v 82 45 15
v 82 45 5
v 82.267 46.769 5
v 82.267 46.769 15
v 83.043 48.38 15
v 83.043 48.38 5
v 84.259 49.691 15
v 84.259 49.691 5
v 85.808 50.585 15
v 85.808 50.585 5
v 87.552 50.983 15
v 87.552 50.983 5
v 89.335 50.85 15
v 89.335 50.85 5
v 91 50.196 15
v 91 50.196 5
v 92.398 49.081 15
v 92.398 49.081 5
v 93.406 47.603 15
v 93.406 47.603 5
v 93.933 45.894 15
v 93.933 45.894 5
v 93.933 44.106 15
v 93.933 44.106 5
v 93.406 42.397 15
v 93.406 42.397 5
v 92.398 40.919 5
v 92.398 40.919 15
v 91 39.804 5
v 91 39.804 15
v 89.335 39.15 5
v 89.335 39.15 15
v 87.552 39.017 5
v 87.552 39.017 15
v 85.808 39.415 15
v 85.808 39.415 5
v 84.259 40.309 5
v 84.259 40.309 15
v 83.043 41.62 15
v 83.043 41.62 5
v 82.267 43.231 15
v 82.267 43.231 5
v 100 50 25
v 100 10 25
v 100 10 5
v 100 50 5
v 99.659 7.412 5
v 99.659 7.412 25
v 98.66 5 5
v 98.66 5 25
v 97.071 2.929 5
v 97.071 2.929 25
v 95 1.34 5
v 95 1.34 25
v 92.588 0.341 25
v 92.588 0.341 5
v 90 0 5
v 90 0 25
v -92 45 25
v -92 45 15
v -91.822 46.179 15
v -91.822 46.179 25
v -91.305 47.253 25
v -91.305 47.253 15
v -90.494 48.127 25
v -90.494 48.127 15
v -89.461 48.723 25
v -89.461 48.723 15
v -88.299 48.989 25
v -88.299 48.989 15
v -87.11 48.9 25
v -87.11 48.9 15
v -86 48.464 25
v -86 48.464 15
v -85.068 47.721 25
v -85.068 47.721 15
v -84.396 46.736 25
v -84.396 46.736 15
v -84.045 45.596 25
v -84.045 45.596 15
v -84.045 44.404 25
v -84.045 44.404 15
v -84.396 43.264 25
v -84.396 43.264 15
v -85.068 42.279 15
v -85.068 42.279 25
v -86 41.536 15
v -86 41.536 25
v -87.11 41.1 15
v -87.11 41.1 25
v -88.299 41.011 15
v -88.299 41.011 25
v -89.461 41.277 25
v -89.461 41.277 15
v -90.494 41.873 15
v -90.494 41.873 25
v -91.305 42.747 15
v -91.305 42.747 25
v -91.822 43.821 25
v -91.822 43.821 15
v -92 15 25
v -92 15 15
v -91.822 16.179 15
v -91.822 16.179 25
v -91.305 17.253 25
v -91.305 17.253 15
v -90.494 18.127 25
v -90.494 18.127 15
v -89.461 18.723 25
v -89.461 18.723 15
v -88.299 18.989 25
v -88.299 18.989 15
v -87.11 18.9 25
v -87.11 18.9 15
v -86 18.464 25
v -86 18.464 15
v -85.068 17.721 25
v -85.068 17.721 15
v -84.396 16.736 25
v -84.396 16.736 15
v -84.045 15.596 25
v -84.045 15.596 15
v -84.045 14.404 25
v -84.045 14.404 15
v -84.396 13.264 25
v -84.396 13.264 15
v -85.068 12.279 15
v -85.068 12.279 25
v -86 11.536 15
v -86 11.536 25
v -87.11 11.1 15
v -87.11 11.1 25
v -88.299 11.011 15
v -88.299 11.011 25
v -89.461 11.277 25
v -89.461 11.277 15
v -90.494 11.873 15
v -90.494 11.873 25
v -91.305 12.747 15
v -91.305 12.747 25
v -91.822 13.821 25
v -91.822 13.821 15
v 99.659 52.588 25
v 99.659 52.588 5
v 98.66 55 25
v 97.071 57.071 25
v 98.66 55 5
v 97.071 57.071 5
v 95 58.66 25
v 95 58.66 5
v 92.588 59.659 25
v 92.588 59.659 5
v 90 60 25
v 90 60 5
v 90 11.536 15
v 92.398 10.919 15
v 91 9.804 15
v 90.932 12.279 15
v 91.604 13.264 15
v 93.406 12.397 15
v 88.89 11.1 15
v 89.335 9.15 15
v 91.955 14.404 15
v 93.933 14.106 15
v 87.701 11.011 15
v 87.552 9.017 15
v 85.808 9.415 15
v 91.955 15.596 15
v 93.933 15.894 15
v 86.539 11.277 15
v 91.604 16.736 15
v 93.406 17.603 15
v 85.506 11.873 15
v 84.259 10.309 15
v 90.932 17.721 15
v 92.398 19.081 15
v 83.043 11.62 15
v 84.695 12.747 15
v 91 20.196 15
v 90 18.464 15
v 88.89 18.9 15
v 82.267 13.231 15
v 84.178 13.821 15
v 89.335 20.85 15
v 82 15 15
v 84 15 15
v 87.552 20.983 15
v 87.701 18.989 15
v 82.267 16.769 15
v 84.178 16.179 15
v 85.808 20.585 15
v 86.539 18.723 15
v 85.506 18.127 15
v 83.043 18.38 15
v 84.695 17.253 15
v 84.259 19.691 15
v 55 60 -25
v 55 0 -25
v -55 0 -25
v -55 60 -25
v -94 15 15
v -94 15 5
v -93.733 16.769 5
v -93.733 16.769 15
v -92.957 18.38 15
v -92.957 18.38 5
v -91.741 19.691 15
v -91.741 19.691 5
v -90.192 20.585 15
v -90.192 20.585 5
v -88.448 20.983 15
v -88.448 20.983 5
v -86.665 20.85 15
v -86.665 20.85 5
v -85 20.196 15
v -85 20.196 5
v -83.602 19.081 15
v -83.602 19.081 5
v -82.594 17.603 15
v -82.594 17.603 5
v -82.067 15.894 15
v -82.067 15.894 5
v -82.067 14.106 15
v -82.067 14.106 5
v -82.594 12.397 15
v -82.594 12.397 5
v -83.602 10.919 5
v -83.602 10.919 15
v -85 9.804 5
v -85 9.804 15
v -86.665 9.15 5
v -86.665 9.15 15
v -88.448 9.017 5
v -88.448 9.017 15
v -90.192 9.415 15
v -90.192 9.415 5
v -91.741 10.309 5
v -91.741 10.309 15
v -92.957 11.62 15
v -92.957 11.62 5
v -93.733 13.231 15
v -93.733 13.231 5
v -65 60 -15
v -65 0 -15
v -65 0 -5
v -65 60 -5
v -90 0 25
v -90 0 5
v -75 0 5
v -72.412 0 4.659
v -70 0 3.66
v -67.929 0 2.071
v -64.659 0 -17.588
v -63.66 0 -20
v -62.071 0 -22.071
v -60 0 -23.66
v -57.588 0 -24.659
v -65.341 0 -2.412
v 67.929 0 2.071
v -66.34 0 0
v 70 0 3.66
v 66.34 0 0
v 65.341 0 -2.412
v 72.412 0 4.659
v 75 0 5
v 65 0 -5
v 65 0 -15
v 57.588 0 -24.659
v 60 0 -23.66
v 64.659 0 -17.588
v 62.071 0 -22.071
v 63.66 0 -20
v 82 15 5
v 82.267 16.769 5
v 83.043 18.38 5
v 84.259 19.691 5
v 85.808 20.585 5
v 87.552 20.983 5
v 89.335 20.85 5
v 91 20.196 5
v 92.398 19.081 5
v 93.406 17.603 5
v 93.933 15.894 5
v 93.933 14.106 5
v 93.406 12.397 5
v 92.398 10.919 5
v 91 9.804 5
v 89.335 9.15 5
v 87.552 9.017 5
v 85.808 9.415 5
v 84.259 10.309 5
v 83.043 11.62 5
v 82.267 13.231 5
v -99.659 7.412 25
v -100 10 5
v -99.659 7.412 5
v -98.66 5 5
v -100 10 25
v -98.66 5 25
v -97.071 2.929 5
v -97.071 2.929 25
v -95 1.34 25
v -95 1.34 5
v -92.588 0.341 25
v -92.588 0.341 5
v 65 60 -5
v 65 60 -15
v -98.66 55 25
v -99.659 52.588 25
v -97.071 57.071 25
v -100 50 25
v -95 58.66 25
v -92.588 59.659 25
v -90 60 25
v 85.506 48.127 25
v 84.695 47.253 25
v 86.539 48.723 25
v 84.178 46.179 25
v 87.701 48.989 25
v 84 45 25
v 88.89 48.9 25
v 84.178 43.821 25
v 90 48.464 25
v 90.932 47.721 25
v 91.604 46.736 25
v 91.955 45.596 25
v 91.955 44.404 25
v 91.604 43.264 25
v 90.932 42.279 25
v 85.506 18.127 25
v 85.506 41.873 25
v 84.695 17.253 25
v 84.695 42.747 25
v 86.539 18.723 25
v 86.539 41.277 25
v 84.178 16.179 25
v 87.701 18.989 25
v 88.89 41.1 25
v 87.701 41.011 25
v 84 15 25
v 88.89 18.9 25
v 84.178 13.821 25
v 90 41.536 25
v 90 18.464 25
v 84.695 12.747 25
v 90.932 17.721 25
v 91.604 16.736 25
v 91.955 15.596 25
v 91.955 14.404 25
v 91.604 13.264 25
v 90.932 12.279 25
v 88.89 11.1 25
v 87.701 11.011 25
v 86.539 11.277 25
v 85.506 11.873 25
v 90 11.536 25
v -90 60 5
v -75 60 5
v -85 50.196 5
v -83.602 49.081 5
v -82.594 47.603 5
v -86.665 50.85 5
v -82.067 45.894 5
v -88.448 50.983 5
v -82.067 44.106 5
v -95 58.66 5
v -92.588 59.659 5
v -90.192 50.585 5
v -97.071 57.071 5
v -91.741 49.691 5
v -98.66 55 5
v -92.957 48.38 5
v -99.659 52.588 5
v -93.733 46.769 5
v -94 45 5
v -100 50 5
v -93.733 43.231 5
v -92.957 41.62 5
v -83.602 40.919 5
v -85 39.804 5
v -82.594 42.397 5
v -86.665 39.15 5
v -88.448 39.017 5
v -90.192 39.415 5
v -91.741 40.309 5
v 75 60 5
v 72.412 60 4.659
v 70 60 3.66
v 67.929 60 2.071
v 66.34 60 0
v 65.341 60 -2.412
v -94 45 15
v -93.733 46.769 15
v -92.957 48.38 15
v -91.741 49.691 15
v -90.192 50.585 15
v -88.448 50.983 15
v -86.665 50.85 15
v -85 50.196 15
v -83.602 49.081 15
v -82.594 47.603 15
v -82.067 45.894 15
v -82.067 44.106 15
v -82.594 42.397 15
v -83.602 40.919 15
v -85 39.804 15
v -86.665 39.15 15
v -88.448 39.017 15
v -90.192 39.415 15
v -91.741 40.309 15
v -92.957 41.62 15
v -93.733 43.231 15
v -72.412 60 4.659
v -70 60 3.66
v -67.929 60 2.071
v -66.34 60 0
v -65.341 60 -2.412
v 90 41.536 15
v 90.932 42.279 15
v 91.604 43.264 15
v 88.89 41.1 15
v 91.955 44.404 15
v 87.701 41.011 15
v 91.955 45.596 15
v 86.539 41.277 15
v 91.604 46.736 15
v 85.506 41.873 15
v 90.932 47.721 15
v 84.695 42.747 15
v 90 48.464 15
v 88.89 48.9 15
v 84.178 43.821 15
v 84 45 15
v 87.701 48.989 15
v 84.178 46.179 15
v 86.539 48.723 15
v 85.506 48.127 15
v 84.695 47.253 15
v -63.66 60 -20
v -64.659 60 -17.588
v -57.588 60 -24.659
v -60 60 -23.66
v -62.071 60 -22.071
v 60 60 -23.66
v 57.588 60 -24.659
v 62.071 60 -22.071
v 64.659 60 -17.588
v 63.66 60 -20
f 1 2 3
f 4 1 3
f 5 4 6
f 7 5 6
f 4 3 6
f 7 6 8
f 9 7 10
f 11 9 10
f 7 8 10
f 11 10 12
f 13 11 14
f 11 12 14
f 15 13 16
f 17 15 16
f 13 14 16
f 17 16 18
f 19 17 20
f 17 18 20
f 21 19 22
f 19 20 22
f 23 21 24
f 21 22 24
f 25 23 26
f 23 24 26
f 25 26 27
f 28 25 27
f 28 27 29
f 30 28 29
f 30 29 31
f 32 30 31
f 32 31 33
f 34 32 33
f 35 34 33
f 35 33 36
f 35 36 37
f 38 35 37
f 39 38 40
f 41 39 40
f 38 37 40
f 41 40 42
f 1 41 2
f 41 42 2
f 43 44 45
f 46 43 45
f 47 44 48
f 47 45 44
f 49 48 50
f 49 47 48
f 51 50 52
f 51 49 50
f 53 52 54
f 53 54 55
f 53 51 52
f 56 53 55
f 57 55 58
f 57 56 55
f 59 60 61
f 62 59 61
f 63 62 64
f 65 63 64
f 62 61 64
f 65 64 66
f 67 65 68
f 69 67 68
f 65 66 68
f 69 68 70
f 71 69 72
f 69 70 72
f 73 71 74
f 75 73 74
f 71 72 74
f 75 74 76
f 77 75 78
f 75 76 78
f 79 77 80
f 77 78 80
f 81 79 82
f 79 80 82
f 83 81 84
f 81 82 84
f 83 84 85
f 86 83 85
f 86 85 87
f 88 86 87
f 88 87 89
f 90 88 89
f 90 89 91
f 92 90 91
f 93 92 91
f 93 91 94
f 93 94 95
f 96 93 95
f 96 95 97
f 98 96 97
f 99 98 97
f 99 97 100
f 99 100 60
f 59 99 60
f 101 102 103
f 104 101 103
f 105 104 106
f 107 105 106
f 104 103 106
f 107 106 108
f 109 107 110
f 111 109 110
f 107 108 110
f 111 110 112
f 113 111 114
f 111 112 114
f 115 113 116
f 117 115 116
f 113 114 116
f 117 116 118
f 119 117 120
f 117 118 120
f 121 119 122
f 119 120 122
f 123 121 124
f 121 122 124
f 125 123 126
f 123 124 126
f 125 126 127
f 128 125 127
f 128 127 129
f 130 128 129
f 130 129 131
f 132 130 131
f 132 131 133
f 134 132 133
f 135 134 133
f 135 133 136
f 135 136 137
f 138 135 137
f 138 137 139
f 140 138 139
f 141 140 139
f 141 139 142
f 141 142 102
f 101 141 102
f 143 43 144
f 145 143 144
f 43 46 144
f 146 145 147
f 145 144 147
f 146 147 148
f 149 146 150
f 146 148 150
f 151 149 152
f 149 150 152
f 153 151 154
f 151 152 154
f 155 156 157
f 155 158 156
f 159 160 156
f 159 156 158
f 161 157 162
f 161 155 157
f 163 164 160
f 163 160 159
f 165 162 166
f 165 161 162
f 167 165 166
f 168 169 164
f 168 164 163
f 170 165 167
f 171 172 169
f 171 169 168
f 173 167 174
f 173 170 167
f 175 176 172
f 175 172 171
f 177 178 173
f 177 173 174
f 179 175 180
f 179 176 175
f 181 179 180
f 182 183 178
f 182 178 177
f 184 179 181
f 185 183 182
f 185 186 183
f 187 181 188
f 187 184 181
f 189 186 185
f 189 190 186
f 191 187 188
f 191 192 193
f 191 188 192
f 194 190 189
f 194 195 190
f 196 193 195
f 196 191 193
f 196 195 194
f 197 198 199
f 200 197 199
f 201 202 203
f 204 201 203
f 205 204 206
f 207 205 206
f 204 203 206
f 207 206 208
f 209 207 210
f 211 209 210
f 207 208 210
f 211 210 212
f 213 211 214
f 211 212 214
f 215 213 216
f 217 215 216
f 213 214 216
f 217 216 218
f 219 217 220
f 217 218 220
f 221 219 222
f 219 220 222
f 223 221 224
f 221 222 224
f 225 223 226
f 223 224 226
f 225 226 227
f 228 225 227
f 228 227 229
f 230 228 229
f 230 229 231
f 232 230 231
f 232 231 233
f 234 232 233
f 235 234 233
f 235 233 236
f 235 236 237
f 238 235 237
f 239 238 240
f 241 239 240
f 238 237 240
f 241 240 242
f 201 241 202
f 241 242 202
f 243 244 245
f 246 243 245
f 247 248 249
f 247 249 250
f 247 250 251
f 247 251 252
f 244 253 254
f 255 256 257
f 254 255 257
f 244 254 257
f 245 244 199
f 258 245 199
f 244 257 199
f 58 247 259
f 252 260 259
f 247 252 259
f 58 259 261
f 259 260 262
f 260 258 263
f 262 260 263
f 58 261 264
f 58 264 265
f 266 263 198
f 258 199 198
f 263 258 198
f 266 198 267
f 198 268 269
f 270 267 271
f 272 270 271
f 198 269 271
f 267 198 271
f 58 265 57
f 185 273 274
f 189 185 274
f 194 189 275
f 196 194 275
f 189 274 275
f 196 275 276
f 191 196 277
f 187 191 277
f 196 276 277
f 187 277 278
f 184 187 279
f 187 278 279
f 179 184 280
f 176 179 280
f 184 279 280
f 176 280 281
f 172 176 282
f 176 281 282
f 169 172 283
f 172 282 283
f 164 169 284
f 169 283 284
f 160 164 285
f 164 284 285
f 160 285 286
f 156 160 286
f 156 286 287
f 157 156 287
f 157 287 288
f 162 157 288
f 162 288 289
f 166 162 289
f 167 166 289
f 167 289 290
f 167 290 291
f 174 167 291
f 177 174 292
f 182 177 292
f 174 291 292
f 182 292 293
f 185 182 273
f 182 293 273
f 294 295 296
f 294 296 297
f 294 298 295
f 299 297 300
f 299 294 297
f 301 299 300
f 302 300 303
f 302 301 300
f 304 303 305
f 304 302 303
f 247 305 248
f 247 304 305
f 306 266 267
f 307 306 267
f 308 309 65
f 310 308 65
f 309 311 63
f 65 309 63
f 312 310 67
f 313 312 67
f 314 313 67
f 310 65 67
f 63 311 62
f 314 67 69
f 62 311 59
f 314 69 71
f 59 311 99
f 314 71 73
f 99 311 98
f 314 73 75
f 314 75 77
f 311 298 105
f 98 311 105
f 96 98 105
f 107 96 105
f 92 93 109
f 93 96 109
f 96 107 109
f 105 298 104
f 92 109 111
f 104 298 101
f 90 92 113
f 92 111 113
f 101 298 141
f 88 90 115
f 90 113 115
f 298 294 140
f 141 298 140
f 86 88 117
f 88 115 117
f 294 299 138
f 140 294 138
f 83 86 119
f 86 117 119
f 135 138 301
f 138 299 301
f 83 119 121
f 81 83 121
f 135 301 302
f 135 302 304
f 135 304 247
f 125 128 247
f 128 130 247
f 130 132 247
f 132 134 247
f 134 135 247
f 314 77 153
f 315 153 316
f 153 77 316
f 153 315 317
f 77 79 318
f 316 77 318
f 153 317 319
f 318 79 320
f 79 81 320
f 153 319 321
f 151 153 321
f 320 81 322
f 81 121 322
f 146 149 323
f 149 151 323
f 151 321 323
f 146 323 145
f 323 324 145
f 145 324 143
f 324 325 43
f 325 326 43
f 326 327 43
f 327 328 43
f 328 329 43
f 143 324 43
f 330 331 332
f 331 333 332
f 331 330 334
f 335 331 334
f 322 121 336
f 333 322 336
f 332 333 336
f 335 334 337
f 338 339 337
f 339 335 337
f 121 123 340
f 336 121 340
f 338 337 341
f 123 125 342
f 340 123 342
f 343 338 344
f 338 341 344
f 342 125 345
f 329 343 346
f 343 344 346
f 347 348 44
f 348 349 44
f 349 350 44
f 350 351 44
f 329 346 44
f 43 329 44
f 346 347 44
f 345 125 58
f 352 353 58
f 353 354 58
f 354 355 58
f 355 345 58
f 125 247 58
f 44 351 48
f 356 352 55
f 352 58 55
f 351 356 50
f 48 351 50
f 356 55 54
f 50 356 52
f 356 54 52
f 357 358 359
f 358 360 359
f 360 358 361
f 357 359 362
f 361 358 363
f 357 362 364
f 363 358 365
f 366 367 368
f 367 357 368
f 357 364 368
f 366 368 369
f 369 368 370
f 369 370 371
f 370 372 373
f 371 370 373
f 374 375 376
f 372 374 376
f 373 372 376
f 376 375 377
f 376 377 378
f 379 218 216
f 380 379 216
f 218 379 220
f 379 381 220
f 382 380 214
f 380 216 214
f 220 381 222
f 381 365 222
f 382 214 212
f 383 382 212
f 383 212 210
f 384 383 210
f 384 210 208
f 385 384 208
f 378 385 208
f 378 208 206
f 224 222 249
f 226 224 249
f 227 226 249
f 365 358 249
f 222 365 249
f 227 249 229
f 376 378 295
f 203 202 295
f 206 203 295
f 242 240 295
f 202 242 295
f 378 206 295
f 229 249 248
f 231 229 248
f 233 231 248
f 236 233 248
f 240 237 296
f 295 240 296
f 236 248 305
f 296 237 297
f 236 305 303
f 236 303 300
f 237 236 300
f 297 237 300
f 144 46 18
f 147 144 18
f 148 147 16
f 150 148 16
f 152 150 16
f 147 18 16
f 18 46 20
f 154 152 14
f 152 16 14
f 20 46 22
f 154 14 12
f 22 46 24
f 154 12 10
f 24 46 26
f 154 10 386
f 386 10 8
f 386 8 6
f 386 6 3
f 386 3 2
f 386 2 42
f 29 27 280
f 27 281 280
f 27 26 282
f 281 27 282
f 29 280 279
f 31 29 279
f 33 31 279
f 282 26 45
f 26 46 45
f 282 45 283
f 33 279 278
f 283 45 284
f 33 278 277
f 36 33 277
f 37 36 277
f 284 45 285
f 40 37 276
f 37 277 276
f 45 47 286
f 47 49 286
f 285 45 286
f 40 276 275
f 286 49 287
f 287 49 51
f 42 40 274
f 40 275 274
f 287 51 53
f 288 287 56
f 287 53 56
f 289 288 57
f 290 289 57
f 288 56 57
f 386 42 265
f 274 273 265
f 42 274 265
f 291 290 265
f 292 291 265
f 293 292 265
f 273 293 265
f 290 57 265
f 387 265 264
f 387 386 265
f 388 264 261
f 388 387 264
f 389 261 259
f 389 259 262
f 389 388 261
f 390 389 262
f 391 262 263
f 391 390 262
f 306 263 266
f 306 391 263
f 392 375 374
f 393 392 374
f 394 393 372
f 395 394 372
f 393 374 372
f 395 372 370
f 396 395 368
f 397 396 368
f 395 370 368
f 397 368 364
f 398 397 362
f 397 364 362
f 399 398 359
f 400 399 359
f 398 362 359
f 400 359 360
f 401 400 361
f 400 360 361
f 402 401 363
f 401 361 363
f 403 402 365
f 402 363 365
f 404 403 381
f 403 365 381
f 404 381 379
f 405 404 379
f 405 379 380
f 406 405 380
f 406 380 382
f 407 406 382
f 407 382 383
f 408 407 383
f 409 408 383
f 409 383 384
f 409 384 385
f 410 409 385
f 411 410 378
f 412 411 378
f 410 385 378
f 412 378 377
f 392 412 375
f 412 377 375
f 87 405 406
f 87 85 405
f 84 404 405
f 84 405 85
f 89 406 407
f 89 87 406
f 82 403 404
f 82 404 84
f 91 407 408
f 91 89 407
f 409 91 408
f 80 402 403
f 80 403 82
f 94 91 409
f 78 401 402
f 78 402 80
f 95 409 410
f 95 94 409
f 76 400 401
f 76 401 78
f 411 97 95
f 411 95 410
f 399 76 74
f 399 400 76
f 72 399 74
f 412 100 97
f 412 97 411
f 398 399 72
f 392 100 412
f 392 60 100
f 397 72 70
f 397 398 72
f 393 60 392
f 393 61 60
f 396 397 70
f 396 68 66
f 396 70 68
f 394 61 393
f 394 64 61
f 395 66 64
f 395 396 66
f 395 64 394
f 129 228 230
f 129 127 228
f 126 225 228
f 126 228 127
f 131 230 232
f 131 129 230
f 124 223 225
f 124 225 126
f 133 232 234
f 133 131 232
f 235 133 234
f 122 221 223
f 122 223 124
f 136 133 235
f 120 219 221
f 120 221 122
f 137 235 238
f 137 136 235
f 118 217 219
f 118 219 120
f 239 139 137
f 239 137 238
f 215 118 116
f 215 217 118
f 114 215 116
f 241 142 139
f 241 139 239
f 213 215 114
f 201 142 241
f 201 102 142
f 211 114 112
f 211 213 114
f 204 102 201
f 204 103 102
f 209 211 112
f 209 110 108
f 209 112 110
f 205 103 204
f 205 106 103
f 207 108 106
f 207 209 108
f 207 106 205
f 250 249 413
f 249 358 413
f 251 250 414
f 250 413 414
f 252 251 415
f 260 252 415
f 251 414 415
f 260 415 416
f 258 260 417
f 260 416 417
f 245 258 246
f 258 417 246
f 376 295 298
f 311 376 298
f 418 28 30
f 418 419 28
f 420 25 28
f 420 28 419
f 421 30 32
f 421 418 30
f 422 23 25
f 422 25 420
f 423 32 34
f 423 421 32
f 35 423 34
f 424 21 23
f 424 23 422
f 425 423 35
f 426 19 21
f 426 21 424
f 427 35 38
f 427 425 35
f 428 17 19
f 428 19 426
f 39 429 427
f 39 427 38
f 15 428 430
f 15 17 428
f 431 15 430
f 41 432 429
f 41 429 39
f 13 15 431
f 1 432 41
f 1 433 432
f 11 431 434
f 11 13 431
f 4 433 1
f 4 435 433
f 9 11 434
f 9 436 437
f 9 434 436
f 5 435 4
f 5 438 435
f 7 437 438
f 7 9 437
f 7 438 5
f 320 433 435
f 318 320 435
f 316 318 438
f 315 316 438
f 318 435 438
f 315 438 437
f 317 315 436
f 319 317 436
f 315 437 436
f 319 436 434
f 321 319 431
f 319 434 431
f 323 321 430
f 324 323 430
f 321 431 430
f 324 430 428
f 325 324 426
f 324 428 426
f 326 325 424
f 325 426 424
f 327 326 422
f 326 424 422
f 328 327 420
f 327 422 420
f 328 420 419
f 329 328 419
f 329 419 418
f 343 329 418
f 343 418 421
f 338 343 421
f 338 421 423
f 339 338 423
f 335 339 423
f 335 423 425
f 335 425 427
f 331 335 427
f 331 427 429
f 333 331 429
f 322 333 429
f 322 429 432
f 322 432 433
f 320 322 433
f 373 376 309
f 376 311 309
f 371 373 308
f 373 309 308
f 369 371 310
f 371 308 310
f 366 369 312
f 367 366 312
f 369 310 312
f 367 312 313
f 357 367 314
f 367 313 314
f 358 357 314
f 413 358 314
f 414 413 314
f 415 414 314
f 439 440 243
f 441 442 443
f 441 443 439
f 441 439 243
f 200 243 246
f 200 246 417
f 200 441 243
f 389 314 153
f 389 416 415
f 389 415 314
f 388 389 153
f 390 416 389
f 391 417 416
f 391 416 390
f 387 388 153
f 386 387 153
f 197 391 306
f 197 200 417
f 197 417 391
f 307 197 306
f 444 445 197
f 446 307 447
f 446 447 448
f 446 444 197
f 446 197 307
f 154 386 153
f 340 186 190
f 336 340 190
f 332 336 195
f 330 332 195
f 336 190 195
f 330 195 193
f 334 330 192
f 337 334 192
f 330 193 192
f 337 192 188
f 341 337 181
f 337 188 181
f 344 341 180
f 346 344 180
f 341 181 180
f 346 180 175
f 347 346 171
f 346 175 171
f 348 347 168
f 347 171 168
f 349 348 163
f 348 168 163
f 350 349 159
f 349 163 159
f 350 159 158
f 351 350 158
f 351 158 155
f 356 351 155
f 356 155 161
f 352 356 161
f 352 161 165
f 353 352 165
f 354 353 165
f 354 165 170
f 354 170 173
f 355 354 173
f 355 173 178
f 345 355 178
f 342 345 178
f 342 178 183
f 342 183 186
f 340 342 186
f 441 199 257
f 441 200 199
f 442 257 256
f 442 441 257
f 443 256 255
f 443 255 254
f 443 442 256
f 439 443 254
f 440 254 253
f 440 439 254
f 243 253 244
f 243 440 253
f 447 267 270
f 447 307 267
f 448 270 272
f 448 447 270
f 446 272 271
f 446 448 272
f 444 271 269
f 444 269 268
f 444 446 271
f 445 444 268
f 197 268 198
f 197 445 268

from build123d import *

# Parameters (mm, degrees)
BOSS_EXTRUDE1_DEPTH = 60
FILLET1_R           = 10
SKETCH2_R           = 4
CUT_EXTRUDE1_DEPTH  = 21
SKETCH3_R           = 6
SKETCH3_R_2         = 4
CUT_EXTRUDE2_DEPTH  = 10


with BuildPart() as part:
    # Sketch1 → Boss-Extrude1 (new body)
    with BuildSketch(Plane(origin=(0, 0, 0), x_dir=(1, 0, 0), z_dir=(0, 1, 0))):
        Polygon((-65, -5), (-100, -5), (-100, -25), (100, -25), (100, -5), (65, -5), (65, 25), (-65, 25), align=None)
    extrude(amount=BOSS_EXTRUDE1_DEPTH)

    # Fillet1
    fillet1_edges = [part.edges().sort_by_distance(p)[0] for p in [
        (-100, 0, 15),
        (-65, 30, 5),
        (-65, 30, -25),
        (65, 30, -25),
        (65, 30, 5),
        (-100, 60, 15),
        (100, 60, 15),
        (100, 0, 15),
    ]]
    fillet(fillet1_edges, radius=FILLET1_R)

    # Sketch2 → Cut-Extrude1 (cut, through all)
    with BuildSketch(Plane(origin=(0, 0, 5), x_dir=(-1, 0, 0), z_dir=(0, 0, -1))):
        with Locations((-88, 45)):
            Circle(SKETCH2_R)
        with Locations((-88, 15)):
            Circle(SKETCH2_R)
        with Locations((88, 15)):
            Circle(SKETCH2_R)
        with Locations((88, 45)):
            Circle(SKETCH2_R)
    extrude(amount=-CUT_EXTRUDE1_DEPTH, mode=Mode.SUBTRACT)

    # Sketch3 → Cut-Extrude2 (cut)
    with BuildSketch(Plane(origin=(0, 0, 5), x_dir=(-1, 0, 0), z_dir=(0, 0, -1))):
        with Locations((88, 15)):
            Circle(SKETCH3_R)
        with Locations((88, 15)):
            Circle(SKETCH3_R_2, mode=Mode.SUBTRACT)
        with Locations((88, 45)):
            Circle(SKETCH3_R)
        with Locations((88, 45)):
            Circle(SKETCH3_R_2, mode=Mode.SUBTRACT)
        with Locations((-88, 15)):
            Circle(SKETCH3_R)
        with Locations((-88, 15)):
            Circle(SKETCH3_R_2, mode=Mode.SUBTRACT)
        with Locations((-88, 45)):
            Circle(SKETCH3_R)
        with Locations((-88, 45)):
            Circle(SKETCH3_R_2, mode=Mode.SUBTRACT)
    extrude(amount=-CUT_EXTRUDE2_DEPTH, mode=Mode.SUBTRACT)


solid = part.part
